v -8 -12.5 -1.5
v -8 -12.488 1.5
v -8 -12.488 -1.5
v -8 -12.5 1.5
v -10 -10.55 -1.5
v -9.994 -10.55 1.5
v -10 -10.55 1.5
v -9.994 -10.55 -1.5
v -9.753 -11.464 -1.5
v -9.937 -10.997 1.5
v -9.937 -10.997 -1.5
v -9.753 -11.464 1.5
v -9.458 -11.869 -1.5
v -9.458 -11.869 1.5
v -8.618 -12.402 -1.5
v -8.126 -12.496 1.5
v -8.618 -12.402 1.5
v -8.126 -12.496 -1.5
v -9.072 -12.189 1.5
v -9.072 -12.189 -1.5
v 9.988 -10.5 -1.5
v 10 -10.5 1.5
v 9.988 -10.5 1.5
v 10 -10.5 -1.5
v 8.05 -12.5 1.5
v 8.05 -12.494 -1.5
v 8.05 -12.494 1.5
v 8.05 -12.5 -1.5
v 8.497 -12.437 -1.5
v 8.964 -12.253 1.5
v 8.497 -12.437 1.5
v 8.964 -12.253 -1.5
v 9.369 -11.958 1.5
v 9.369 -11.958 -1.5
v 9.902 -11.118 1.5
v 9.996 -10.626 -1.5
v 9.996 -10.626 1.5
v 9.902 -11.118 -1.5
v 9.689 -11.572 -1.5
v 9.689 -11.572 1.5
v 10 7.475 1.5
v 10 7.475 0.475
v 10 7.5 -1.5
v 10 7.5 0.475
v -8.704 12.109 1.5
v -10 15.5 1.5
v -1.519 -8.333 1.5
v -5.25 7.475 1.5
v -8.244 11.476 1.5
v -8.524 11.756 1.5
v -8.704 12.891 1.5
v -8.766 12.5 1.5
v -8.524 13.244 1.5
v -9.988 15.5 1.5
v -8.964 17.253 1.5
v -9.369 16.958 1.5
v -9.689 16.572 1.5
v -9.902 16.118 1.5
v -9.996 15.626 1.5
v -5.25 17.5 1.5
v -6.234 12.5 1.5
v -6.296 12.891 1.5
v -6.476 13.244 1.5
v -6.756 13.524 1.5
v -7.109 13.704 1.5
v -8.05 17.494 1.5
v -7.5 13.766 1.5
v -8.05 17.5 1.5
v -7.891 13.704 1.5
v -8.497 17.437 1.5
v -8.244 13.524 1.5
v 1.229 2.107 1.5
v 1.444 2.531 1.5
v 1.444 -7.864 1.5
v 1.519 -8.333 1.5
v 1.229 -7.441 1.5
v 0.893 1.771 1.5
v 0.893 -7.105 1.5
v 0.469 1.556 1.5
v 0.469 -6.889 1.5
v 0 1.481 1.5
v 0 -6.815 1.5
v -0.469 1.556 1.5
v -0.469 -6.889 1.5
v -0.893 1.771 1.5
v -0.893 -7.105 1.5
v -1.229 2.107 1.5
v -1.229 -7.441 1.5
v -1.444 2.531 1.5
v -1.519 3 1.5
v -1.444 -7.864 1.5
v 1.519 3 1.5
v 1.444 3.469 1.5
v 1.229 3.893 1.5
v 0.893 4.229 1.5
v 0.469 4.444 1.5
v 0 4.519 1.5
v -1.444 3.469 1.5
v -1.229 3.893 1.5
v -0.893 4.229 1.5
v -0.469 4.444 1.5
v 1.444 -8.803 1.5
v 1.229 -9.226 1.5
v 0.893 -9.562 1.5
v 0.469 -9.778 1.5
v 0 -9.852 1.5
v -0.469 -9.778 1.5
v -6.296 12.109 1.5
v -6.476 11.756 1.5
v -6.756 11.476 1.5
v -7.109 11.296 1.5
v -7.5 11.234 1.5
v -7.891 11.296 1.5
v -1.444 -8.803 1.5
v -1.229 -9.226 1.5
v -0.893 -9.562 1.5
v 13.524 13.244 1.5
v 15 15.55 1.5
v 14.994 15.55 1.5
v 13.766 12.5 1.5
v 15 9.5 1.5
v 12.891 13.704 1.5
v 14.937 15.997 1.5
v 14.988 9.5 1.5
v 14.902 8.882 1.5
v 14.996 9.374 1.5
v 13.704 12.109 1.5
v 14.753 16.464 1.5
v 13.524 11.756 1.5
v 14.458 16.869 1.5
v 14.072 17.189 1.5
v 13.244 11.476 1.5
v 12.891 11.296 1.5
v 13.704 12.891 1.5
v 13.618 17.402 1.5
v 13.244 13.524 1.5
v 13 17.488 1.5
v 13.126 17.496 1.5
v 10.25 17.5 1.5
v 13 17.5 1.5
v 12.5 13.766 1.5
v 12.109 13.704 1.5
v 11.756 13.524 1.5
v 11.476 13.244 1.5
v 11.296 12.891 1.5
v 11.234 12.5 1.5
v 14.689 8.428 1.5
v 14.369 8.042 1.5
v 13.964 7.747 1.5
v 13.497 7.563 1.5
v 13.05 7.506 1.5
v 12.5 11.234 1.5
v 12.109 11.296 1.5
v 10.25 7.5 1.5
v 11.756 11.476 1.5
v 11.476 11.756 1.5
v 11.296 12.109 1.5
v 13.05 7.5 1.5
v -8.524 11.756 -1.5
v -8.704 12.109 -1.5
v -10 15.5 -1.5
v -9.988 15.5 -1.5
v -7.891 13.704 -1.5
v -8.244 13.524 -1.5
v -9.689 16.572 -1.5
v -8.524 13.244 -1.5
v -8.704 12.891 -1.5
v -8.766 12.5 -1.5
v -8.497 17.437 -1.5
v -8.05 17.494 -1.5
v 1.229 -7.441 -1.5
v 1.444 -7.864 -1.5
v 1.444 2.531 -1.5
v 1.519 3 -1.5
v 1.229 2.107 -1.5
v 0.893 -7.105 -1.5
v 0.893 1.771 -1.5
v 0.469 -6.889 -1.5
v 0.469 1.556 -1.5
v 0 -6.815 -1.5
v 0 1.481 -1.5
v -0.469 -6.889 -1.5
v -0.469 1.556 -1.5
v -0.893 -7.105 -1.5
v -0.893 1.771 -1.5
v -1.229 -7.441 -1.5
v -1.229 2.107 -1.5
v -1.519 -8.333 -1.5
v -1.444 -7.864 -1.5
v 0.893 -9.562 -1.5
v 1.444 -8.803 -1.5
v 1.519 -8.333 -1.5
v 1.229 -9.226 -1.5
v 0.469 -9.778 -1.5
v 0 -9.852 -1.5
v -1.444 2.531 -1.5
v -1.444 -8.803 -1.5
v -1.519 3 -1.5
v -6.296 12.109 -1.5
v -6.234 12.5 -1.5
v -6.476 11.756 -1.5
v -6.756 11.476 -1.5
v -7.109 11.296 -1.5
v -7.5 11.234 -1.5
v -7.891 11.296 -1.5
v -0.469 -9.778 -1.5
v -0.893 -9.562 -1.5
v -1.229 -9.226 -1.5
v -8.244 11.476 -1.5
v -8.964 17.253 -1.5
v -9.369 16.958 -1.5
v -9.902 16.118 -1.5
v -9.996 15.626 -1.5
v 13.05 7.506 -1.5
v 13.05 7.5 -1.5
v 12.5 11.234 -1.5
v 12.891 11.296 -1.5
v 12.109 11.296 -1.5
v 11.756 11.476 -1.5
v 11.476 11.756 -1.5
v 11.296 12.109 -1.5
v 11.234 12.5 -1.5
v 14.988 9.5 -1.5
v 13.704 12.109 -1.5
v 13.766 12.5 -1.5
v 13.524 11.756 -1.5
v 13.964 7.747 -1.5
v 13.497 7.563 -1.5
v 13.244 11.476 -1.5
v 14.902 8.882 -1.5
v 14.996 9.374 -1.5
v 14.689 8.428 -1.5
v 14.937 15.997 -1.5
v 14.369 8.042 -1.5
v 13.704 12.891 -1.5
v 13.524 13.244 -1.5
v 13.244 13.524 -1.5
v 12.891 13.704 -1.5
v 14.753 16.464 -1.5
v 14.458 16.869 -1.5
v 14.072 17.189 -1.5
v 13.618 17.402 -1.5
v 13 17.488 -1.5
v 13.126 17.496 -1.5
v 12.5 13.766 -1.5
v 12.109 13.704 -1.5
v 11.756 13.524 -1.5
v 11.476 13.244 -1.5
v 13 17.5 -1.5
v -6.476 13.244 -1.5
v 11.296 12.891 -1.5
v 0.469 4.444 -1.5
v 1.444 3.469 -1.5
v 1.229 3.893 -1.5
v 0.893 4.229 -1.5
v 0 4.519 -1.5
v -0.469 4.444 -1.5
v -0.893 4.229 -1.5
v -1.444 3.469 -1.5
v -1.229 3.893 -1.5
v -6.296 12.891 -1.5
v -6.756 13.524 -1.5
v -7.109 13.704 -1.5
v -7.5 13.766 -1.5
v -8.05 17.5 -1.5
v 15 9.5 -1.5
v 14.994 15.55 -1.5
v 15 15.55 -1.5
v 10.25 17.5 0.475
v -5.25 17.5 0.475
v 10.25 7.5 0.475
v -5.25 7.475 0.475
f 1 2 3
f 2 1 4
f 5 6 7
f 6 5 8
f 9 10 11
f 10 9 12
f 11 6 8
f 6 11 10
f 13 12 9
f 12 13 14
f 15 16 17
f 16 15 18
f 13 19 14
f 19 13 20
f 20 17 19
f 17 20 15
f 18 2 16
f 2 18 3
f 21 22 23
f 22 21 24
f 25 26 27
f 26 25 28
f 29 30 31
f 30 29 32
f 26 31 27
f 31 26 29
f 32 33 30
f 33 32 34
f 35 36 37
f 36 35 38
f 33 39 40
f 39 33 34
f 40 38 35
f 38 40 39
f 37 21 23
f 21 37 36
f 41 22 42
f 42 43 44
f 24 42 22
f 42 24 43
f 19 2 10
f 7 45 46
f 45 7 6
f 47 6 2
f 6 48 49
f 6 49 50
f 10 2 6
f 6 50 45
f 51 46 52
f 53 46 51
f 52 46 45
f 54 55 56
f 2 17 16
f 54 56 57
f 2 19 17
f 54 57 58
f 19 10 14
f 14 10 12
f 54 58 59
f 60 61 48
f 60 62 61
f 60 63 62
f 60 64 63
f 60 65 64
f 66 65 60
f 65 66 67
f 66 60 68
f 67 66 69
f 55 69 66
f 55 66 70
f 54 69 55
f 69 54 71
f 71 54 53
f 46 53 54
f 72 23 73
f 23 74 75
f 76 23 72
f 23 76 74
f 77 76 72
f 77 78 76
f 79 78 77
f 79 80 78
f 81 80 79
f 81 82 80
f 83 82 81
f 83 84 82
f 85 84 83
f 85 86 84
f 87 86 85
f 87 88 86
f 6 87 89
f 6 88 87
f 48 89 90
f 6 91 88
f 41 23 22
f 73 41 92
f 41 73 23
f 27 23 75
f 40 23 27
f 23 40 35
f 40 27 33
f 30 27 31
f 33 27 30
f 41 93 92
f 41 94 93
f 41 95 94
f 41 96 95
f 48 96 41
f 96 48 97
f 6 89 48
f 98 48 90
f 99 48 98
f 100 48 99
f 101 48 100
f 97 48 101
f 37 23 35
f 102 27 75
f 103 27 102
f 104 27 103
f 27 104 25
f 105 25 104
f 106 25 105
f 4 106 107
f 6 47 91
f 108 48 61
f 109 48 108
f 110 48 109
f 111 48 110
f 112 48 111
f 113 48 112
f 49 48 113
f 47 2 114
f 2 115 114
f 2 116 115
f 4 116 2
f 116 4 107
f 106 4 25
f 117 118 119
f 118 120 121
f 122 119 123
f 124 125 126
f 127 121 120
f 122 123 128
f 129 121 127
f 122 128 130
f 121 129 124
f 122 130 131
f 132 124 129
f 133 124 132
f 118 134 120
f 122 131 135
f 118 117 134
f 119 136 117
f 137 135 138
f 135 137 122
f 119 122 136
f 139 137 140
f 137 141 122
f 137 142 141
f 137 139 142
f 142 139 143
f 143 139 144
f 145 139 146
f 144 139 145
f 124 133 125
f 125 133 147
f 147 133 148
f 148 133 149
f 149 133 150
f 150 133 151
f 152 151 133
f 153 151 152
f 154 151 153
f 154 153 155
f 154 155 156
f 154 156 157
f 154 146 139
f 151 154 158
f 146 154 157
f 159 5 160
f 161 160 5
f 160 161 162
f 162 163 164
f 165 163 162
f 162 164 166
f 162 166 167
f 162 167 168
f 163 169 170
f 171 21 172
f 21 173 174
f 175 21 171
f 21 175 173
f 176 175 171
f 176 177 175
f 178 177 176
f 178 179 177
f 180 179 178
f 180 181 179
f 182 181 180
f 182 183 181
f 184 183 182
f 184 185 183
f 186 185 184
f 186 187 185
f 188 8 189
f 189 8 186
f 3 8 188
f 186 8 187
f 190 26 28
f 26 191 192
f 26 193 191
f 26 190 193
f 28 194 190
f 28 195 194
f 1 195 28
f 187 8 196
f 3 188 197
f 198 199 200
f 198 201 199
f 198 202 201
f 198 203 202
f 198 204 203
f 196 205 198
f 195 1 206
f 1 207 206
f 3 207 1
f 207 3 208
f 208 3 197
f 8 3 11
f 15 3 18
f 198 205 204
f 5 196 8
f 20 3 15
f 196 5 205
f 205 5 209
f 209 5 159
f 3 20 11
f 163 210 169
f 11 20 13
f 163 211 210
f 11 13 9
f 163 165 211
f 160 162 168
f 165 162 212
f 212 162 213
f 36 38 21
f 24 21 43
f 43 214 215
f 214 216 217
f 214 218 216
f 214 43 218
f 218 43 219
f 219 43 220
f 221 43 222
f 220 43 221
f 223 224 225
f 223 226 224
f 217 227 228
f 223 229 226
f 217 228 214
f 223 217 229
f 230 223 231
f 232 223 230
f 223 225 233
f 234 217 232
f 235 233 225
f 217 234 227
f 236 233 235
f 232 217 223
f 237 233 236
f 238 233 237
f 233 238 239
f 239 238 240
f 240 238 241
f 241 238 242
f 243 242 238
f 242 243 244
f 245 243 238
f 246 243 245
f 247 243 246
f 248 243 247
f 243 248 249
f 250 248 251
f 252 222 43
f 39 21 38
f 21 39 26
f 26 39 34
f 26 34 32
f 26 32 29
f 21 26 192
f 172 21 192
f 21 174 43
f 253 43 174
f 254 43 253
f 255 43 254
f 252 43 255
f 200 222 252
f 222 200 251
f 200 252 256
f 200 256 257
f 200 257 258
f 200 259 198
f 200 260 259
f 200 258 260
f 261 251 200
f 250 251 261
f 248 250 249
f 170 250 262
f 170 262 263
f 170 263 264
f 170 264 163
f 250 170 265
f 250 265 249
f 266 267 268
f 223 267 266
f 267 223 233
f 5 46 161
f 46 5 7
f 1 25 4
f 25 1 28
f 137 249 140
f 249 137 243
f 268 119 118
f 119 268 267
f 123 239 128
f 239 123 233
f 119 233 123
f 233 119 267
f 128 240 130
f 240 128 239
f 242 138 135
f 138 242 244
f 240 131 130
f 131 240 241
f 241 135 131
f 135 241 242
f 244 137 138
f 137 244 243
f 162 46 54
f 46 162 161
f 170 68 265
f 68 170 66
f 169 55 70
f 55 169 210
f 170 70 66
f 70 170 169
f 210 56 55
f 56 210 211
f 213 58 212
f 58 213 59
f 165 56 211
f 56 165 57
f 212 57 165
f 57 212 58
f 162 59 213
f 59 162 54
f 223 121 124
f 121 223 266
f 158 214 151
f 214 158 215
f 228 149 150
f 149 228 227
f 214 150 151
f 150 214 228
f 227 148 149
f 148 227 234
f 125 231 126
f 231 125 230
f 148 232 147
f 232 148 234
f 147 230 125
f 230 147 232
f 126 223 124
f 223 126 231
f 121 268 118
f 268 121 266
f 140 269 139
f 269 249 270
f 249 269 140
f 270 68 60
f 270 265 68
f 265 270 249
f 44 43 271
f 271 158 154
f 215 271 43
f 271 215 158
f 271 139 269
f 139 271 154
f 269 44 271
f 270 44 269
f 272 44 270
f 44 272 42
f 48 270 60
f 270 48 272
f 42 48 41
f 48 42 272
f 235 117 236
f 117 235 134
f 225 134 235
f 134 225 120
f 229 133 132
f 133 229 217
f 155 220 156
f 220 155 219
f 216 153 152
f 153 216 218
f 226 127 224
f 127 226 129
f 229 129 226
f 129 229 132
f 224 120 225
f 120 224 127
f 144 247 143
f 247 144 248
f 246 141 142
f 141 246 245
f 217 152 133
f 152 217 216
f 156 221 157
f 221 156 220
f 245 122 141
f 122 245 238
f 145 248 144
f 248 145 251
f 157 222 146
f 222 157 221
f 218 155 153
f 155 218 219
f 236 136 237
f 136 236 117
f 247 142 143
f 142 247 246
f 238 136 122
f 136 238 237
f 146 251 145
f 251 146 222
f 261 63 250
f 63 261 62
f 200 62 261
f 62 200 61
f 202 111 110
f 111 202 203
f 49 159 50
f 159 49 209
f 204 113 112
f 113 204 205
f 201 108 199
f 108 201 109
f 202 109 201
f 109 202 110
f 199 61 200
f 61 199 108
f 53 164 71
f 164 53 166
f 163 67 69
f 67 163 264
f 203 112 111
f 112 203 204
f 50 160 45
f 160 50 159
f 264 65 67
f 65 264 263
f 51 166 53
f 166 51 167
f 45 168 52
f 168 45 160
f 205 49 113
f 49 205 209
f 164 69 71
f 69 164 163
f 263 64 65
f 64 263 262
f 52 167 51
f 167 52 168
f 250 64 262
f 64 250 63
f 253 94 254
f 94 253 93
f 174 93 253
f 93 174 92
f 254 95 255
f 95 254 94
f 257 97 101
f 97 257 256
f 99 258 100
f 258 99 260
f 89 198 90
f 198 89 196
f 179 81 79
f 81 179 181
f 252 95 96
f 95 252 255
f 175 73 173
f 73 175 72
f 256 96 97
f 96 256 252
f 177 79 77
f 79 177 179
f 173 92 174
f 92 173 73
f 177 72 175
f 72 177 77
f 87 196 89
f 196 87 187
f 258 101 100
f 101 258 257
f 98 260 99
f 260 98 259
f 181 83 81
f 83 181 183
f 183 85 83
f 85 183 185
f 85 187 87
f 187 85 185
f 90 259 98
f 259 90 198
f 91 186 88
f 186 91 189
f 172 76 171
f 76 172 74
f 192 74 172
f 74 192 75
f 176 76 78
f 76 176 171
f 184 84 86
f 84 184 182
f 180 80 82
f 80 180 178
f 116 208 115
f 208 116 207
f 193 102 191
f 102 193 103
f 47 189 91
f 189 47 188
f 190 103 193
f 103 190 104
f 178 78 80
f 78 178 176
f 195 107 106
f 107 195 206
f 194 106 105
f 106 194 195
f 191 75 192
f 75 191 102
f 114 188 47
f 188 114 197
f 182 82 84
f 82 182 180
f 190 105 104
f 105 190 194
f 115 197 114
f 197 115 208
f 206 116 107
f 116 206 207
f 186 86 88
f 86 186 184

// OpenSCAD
// The amount added to a cut out to ensure a clean hole. 
holeCreationOffset=0.05;
// How thick the endstop is 
endstopThickness=3;
// How deep the recess is inside of the endstop, this is the cut out for the circuitry on the bottomside of the endstop PCB
endstopRecessDepth=1;
// How tall the recess is into the endstop part
endstopRecessHeight=10;
// How wide the recessed portion of the endstop is
endstopRecessWidth=15.5;
// How tall the over all endstop is
endstopHeight=25;
// How wide the endstop is, this should equal your aluminum extrusion width
endstopNarrowWidth=20;
// The shelf that is on the endstop, this is to offset the opticoupler by the amount needed to center the opticoupler
enstopShelfWidth=25;
// How tall the shelf is, this should be the height of the opticoupler
endstopShelfHeight=10;
endstopShelfOffset=enstopShelfWidth-endstopNarrowWidth;
// The offset for the opticouplers mounting holes, center to center
endstopBoltHoleWidth=19.5;
// The diameter of the mounting holes for the opticoupler
endstopBoltHoleDiameter=2.5;
// The diameter of the mounting holes for the endstop bracket itself
mountingBoltHoleDiameter=3;
mountingBoltHoleRadius=mountingBoltHoleDiameter/2;
endstopBoltHoleRadius=endstopBoltHoleDiameter/2;


module cylinder_outer(height,radius,fn){
   fudge = 1/cos(180/fn);
   cylinder(h=height,r=radius*fudge,$fn=fn, center = true);
}
   
module cylinder_outerdual(height,radius,radiustwo,fn){
   fudge = 1/cos(180/fn);
   cylinder(h=height,r1=radius*fudge,r2=radiustwo*fudge,$fn=fn, center = true);
}
   
module cylinder_mid(height,radius,fn){
   fudge = (1+1/cos(180/fn))/2;
   cylinder(h=height,r=radius*fudge,$fn=fn, center = true);
}
   
module createMeniscus(h,radius) {// This module creates the shape that needs to be substracted from a cube to make its corners rounded.
    difference(){        //This shape is basicly the difference between a quarter of cylinder and a cube
       translate([radius/2+0.1,radius/2+0.1,0]){
          cube([radius+0.2,radius+0.1,h+0.2],center=true);         // All that 0.x numbers are to avoid "ghost boundaries" when substracting
       }

       cylinder(h=h+0.2,r=radius,$fn = 25,center=true);
    }
}

module roundCornersCube(x,y,z,r){  // Now we just substract the shape we have created in the four corners
    difference(){
       cube([x,y,z], center=true);

    translate([x/2-r,y/2-r]){  // We move to the first corner (x,y)
          rotate(0){  
             createMeniscus(z,r); // And substract the meniscus
          }
       }
       translate([-x/2+r,y/2-r]){ // To the second corner (-x,y)
          rotate(90){
             createMeniscus(z,r); // But this time we have to rotate the meniscus 90 deg
          }
       }
          translate([-x/2+r,-y/2+r]){ // ... 
          rotate(180){
             createMeniscus(z,r);
          }
       }
          translate([x/2-r,-y/2+r]){
          rotate(270){
             createMeniscus(z,r);
          }
       }
    }
}


module endstop(){
    difference (){
        union(){
            roundCornersCube(endstopNarrowWidth,endstopHeight,endstopThickness,2);
            translate([endstopShelfOffset/2,endstopHeight/2,0]) roundCornersCube(enstopShelfWidth,endstopShelfHeight,endstopThickness,2);
        }
    translate([endstopShelfOffset/2,endstopHeight/2,(endstopThickness/2) - (endstopRecessDepth/2)]) cube([endstopRecessWidth,endstopRecessHeight + holeCreationOffset,endstopRecessDepth + holeCreationOffset], center=true);
        translate([endstopNarrowWidth/2 + endstopShelfOffset/2,endstopHeight/2,0]) cylinder_outer(20,endstopBoltHoleRadius,20); 
translate([-enstopShelfWidth/2 + endstopShelfOffset,endstopHeight/2,0]) cylinder_outer(20,endstopBoltHoleRadius,20); 
        
        translate([0,3,0]) cylinder_outer(20,mountingBoltHoleRadius,20); 
        translate([0,-endstopHeight/3,0]) cylinder_outer(20,mountingBoltHoleRadius,20);
    }
}


endstop();
